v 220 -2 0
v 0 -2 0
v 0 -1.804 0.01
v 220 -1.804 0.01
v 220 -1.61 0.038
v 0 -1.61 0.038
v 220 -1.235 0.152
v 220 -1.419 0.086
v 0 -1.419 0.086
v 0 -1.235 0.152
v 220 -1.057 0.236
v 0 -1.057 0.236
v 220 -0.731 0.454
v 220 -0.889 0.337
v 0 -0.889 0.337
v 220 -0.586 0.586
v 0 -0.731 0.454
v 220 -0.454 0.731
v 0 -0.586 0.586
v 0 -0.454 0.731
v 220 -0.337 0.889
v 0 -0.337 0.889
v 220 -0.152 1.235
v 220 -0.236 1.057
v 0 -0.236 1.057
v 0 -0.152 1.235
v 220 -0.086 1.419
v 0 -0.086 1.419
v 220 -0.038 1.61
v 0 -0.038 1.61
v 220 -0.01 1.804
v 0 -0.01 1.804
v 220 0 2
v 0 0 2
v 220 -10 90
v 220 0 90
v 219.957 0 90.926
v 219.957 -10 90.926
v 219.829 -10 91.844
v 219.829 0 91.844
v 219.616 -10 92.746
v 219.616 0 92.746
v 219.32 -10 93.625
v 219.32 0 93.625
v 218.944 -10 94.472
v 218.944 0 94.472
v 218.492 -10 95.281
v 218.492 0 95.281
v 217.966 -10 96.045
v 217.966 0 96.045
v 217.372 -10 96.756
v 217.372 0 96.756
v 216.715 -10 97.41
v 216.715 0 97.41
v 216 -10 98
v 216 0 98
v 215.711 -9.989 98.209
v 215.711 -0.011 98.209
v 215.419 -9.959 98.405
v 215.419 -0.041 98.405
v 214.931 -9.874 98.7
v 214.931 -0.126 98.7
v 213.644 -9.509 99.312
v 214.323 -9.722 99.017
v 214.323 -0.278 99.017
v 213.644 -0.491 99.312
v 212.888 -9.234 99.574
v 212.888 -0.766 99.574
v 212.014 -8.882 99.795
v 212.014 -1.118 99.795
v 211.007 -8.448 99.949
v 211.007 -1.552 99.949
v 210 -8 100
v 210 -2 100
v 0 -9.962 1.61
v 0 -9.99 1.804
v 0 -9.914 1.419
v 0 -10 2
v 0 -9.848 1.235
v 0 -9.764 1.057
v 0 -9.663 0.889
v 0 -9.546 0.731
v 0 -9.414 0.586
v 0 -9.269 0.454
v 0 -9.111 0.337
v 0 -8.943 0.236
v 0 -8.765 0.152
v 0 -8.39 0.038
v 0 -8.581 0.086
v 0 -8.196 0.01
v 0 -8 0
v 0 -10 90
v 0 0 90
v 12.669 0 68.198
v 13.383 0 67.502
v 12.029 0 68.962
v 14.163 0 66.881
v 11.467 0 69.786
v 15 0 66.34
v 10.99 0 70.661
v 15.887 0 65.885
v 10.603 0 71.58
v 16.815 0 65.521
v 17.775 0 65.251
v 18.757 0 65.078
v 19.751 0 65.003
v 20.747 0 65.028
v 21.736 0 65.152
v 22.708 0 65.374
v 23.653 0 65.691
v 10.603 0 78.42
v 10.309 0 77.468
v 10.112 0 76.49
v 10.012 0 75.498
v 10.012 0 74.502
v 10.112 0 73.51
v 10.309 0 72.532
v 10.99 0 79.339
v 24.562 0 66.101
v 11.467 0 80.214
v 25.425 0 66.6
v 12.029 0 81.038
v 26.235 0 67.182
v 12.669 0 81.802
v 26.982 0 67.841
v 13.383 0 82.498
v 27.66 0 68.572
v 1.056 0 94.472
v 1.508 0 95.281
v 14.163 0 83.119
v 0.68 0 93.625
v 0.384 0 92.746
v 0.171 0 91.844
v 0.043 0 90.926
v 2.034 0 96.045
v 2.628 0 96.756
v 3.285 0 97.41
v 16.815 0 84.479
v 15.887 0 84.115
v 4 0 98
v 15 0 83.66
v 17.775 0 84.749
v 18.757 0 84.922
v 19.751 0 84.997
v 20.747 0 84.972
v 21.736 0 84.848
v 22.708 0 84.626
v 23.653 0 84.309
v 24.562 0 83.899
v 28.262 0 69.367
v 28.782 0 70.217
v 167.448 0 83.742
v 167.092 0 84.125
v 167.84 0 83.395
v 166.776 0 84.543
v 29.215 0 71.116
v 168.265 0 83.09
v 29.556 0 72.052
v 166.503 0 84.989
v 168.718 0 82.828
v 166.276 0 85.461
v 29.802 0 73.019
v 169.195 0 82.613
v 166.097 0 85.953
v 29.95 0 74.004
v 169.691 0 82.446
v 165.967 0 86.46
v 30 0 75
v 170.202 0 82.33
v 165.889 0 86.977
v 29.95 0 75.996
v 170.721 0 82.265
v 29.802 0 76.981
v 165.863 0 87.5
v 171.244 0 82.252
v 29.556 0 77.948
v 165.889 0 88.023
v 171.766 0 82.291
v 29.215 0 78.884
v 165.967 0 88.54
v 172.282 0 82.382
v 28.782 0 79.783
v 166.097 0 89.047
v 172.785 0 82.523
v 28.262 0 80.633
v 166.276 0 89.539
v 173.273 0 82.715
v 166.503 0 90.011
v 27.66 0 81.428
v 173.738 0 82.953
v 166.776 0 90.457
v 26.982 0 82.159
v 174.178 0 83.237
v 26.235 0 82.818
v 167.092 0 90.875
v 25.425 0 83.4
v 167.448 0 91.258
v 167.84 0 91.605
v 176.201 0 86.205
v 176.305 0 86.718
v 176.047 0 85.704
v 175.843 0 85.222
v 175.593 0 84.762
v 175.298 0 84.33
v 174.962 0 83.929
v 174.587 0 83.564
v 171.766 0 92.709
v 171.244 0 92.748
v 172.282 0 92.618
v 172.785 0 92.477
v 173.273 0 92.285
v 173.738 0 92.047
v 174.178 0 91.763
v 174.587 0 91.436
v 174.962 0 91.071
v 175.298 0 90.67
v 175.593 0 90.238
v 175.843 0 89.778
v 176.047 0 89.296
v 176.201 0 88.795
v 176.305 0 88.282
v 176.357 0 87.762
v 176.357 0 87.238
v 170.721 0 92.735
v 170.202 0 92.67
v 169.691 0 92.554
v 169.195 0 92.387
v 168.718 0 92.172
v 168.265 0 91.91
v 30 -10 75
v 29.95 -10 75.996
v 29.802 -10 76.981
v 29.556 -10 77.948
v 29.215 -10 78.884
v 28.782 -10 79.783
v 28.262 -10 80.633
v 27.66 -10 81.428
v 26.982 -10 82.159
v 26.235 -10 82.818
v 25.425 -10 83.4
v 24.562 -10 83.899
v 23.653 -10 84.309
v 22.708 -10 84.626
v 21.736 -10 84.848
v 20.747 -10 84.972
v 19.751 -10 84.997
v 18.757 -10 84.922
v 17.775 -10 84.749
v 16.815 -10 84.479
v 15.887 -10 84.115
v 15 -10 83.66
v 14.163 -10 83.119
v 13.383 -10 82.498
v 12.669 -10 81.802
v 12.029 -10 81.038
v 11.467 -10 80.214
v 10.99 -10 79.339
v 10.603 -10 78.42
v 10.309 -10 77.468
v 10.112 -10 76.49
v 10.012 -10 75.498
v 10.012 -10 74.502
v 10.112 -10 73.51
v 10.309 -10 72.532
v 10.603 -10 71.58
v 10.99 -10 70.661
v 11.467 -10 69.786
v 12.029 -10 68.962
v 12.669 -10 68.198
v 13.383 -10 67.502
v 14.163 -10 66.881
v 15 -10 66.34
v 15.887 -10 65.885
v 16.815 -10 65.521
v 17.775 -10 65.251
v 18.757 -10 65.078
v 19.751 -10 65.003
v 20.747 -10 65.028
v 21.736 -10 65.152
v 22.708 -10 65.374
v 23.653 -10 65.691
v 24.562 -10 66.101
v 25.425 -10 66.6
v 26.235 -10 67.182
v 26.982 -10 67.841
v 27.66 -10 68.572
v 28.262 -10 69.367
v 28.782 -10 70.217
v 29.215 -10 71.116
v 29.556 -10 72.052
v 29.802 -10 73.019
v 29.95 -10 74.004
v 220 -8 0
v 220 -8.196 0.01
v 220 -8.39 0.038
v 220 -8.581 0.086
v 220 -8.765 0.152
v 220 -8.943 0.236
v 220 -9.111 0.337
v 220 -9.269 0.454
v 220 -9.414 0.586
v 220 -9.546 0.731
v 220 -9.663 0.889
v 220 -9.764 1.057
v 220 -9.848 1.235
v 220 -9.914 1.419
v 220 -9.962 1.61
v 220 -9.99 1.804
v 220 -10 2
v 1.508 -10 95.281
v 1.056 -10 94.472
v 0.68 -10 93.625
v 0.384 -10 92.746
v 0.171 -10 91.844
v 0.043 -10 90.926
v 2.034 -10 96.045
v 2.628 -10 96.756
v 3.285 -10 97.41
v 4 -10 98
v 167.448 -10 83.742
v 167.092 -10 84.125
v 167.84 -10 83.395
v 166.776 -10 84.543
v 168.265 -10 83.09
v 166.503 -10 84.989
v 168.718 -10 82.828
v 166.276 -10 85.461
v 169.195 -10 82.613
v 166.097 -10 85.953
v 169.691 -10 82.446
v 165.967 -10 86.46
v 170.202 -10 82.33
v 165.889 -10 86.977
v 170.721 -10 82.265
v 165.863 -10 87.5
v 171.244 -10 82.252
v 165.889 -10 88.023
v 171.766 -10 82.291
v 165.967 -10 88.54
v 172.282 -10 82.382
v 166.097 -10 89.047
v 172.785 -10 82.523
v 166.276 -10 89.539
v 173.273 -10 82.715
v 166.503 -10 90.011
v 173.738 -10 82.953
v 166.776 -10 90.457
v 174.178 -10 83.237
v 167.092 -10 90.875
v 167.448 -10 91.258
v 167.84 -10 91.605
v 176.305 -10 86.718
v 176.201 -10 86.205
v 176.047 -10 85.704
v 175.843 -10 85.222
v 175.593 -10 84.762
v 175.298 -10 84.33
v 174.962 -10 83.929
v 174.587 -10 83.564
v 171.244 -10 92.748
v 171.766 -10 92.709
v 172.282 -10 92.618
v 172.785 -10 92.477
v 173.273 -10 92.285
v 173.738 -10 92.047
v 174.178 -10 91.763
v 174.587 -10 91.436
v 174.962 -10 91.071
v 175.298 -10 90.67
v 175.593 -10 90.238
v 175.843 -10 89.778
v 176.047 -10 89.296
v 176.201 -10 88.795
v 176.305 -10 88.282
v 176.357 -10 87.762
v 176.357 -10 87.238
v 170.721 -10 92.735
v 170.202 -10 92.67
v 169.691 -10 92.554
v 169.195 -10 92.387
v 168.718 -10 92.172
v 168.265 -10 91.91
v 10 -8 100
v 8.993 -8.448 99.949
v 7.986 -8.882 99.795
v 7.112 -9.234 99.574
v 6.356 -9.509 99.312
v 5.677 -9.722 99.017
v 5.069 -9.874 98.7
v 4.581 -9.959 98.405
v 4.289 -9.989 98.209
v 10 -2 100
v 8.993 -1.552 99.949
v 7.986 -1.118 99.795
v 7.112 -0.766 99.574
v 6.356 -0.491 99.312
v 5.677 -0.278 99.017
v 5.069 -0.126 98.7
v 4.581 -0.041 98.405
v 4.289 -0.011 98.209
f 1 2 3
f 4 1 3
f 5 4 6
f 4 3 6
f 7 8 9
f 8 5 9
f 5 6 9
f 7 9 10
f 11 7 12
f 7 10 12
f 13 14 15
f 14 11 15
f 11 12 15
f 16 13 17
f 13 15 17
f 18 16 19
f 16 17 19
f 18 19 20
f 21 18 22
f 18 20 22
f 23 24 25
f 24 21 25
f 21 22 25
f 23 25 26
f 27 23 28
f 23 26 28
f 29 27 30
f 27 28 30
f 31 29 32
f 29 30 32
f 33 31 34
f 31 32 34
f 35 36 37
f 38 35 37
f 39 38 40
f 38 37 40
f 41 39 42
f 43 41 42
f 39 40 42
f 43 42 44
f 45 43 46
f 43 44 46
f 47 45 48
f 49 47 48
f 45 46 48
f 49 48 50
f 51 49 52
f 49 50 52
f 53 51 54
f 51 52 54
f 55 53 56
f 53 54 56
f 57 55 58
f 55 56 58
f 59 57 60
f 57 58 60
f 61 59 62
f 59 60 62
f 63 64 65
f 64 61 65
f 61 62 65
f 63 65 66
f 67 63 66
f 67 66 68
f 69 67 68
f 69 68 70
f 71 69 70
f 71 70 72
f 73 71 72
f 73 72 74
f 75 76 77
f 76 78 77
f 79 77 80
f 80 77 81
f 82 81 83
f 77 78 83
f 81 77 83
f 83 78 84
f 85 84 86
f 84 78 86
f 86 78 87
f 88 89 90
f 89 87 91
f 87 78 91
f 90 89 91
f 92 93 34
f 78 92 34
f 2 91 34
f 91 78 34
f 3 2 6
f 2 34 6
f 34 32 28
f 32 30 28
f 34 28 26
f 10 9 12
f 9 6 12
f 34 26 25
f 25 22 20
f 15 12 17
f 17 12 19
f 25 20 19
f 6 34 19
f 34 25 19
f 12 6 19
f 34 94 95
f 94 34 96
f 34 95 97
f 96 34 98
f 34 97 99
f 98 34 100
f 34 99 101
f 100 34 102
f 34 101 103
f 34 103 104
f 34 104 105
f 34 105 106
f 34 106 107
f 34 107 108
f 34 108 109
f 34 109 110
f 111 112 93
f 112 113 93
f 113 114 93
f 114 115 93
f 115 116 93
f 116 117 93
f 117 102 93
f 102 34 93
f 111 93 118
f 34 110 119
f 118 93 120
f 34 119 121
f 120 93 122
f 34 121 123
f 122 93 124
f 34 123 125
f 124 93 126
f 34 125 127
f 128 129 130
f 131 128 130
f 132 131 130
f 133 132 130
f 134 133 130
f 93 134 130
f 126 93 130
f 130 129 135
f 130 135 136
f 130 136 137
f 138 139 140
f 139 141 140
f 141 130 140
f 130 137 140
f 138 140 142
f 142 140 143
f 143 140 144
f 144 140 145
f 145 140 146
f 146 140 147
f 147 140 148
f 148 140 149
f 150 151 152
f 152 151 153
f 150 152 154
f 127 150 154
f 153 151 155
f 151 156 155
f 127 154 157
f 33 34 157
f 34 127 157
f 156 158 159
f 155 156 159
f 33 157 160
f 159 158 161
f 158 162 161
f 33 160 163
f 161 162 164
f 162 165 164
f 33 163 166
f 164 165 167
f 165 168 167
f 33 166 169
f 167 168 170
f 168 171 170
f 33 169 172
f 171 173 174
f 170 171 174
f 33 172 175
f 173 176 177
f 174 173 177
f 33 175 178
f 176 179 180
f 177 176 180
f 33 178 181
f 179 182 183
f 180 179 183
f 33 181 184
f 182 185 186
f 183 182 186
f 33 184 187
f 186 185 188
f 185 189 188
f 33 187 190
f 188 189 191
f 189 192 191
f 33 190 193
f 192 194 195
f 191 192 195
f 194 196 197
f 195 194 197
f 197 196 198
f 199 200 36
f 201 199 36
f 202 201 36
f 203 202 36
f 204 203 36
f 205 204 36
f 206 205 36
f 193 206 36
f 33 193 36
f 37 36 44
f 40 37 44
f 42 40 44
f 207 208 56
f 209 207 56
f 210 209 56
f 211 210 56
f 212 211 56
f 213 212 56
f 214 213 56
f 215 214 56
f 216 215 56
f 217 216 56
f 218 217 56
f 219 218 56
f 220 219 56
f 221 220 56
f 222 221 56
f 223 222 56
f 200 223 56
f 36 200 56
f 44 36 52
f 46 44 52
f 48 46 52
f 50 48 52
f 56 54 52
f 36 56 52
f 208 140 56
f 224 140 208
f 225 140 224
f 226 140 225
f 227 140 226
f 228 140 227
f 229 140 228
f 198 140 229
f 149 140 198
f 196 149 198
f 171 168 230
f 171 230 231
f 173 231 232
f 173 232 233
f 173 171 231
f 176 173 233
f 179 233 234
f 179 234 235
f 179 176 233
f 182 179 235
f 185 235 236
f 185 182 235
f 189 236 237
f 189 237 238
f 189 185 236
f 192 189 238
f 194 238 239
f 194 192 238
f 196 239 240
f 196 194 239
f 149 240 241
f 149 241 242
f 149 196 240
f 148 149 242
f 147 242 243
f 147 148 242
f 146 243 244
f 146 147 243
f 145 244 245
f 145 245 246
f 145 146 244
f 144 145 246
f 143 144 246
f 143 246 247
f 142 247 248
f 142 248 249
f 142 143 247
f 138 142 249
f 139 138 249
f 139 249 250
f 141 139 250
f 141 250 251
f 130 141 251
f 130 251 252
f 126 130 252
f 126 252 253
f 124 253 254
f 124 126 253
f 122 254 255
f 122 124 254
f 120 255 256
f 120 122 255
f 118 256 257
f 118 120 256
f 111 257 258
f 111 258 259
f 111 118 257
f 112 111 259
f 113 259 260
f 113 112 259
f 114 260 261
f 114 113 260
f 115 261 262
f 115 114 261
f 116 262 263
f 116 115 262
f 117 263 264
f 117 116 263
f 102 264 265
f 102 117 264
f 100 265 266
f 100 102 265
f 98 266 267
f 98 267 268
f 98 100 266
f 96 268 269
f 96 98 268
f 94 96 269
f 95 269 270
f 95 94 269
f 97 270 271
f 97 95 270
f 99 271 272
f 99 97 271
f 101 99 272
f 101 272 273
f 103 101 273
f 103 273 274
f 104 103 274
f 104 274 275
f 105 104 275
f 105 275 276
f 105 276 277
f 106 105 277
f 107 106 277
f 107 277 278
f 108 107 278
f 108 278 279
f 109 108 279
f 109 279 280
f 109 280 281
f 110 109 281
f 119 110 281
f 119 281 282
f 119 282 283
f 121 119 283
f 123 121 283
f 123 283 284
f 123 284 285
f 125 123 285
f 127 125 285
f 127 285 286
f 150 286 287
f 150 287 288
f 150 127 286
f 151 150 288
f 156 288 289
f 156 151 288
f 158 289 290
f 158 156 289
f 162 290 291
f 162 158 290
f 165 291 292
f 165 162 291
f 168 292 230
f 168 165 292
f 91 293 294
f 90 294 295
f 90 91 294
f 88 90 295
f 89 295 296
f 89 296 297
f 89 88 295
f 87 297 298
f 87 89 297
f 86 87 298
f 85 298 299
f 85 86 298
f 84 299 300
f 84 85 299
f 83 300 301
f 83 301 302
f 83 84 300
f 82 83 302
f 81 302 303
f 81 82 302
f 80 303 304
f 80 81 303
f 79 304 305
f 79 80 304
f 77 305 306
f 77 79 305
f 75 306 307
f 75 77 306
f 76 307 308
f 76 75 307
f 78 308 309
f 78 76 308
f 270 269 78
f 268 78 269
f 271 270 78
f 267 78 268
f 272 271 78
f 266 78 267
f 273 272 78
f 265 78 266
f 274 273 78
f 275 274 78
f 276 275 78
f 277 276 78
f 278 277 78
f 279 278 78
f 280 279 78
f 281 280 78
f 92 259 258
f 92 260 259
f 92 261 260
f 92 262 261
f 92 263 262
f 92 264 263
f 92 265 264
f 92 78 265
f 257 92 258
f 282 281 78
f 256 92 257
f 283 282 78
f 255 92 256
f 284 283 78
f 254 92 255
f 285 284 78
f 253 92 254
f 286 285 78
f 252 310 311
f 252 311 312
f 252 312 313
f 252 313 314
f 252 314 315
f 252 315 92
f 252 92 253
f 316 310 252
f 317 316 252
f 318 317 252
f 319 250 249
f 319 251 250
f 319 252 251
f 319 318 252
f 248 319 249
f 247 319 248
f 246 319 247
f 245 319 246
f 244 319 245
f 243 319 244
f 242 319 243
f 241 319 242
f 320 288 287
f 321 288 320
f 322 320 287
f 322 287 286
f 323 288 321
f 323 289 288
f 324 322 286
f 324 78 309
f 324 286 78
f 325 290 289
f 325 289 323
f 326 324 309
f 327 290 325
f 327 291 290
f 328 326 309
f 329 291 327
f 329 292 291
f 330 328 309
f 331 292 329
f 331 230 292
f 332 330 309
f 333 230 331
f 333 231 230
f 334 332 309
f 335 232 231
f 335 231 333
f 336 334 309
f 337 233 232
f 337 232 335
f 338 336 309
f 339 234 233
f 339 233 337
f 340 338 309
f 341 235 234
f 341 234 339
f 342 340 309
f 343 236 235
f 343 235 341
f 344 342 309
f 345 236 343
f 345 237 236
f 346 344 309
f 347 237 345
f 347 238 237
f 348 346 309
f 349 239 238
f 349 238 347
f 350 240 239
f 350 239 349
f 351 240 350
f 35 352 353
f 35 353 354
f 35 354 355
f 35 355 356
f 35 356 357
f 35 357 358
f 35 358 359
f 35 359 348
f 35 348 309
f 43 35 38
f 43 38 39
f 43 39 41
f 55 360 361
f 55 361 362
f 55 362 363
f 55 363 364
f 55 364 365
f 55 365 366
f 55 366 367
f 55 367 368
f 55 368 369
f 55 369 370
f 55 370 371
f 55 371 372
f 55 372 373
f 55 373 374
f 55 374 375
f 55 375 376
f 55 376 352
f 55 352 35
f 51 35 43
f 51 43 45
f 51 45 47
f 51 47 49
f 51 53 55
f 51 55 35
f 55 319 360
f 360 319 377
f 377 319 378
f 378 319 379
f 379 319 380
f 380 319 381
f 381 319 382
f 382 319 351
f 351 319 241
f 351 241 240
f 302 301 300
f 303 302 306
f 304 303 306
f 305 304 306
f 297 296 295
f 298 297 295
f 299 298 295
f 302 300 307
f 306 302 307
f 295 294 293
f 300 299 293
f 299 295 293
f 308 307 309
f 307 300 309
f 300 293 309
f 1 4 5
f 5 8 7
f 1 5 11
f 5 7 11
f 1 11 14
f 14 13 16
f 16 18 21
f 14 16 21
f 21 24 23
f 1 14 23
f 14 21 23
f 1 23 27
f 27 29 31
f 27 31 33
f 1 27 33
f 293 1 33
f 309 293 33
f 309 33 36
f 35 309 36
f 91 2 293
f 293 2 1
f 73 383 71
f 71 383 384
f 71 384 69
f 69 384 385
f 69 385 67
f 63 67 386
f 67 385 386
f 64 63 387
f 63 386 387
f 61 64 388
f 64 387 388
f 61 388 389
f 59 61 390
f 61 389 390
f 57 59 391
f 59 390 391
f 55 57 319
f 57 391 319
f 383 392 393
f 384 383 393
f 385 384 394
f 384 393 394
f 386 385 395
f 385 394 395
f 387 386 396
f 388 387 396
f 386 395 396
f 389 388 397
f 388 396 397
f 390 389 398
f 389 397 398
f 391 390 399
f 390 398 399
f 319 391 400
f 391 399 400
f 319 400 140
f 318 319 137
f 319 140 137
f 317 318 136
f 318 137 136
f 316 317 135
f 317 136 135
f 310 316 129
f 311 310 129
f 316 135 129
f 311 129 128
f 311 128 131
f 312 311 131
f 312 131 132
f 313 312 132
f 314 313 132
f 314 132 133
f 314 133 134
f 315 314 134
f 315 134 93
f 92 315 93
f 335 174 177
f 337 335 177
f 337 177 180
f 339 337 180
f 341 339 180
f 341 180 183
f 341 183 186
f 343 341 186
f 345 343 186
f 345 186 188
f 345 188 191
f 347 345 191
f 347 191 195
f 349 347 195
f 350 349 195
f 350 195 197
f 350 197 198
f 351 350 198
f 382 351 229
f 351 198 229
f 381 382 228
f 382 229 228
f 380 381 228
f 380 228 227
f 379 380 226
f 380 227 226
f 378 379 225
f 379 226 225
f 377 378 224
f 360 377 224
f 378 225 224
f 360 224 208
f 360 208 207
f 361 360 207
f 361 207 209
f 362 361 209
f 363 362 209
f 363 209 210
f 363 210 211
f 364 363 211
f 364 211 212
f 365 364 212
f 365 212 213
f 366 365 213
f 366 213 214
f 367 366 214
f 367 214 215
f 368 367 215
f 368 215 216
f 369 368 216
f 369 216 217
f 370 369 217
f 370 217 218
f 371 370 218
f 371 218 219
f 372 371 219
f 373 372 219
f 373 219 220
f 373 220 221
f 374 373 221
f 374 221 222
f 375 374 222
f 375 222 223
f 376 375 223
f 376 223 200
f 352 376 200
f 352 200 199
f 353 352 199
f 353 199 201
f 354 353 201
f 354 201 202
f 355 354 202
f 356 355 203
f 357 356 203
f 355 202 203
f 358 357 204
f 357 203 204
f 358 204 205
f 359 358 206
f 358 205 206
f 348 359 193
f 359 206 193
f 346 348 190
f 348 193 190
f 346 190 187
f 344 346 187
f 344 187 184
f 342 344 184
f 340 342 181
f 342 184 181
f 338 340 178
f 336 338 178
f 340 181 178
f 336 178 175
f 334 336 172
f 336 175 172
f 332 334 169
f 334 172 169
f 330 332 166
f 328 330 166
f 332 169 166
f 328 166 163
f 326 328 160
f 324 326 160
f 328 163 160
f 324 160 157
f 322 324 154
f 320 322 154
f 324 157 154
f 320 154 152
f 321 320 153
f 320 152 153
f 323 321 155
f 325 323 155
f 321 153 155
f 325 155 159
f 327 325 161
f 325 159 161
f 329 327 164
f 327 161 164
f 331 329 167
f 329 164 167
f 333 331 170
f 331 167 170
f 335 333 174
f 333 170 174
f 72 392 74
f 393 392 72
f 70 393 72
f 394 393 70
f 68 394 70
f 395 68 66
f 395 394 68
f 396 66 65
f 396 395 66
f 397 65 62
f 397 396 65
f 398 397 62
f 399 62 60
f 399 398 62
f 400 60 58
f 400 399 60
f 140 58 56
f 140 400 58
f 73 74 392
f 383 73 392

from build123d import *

# Parameters (mm, degrees)
F0_R        = 10
F1_DEPTH    = 10
F2_T1_DEPTH = 217
F2_T3_DEPTH = 230
F4_D        = 10.5


# Not quite as in the source:
# - a fillet or chamfer that OpenCascade refuses, or shapes differently, is made with other operations: its cross-section is extruded or revolved along the edge and cut away or added


with BuildPart() as f1:
    # F0 (on Front) → F1 (new body)
    with BuildSketch(Plane.XZ):
        with BuildLine():
            Line((0, 90), (0, 0))
            Line((0, 0), (220, 0))
            Line((220, 0), (220, 90))
            ThreePointArc((220, 90), (217.0710678119, 97.0710678119), (210, 100))
            Line((210, 100), (10, 100))
            ThreePointArc((10, 100), (2.9289321881, 97.0710678119), (0, 90))
        make_face()
        with Locations((20, 75)):
            Circle(F0_R, mode=Mode.SUBTRACT)
    extrude(amount=F1_DEPTH)

    # F2: fillet of radius 2 on 4 edges, made by hand

    # F2_s2 → F2_t1 (cut)
    with BuildSketch(Plane.YZ.offset(1.5)):
        with BuildLine():
            ThreePointArc((-8, 100), (-9.4142135624, 99.4142135624), (-10, 98))
            Line((-10, 98), (-10, 100))
            Line((-10, 100), (-8, 100))
        make_face()
        with BuildLine():
            ThreePointArc((-2, 100), (-0.5857864376, 99.4142135624), (0, 98))
            Line((0, 98), (0, 100))
            Line((0, 100), (-2, 100))
        make_face()
    extrude(amount=F2_T1_DEPTH, mode=Mode.SUBTRACT)

    # F2_s4 → F2_t3 (cut)
    with BuildSketch(Plane.YZ.offset(-5)):
        with BuildLine():
            ThreePointArc((-8, 0), (-9.4142135624, 0.5857864376), (-10, 2))
            Line((-10, 2), (-10, 0))
            Line((-10, 0), (-8, 0))
        make_face()
        with BuildLine():
            ThreePointArc((-2, 0), (-0.5857864376, 0.5857864376), (0, 2))
            Line((0, 2), (0, 0))
            Line((0, 0), (-2, 0))
        make_face()
    extrude(amount=F2_T3_DEPTH, mode=Mode.SUBTRACT)

    # F4 (through all)
    with Locations(Plane.XZ.offset(10)):
        with Locations((171.1133077741, 87.5)):
            Hole(F4_D / 2)


solid = f1.part
